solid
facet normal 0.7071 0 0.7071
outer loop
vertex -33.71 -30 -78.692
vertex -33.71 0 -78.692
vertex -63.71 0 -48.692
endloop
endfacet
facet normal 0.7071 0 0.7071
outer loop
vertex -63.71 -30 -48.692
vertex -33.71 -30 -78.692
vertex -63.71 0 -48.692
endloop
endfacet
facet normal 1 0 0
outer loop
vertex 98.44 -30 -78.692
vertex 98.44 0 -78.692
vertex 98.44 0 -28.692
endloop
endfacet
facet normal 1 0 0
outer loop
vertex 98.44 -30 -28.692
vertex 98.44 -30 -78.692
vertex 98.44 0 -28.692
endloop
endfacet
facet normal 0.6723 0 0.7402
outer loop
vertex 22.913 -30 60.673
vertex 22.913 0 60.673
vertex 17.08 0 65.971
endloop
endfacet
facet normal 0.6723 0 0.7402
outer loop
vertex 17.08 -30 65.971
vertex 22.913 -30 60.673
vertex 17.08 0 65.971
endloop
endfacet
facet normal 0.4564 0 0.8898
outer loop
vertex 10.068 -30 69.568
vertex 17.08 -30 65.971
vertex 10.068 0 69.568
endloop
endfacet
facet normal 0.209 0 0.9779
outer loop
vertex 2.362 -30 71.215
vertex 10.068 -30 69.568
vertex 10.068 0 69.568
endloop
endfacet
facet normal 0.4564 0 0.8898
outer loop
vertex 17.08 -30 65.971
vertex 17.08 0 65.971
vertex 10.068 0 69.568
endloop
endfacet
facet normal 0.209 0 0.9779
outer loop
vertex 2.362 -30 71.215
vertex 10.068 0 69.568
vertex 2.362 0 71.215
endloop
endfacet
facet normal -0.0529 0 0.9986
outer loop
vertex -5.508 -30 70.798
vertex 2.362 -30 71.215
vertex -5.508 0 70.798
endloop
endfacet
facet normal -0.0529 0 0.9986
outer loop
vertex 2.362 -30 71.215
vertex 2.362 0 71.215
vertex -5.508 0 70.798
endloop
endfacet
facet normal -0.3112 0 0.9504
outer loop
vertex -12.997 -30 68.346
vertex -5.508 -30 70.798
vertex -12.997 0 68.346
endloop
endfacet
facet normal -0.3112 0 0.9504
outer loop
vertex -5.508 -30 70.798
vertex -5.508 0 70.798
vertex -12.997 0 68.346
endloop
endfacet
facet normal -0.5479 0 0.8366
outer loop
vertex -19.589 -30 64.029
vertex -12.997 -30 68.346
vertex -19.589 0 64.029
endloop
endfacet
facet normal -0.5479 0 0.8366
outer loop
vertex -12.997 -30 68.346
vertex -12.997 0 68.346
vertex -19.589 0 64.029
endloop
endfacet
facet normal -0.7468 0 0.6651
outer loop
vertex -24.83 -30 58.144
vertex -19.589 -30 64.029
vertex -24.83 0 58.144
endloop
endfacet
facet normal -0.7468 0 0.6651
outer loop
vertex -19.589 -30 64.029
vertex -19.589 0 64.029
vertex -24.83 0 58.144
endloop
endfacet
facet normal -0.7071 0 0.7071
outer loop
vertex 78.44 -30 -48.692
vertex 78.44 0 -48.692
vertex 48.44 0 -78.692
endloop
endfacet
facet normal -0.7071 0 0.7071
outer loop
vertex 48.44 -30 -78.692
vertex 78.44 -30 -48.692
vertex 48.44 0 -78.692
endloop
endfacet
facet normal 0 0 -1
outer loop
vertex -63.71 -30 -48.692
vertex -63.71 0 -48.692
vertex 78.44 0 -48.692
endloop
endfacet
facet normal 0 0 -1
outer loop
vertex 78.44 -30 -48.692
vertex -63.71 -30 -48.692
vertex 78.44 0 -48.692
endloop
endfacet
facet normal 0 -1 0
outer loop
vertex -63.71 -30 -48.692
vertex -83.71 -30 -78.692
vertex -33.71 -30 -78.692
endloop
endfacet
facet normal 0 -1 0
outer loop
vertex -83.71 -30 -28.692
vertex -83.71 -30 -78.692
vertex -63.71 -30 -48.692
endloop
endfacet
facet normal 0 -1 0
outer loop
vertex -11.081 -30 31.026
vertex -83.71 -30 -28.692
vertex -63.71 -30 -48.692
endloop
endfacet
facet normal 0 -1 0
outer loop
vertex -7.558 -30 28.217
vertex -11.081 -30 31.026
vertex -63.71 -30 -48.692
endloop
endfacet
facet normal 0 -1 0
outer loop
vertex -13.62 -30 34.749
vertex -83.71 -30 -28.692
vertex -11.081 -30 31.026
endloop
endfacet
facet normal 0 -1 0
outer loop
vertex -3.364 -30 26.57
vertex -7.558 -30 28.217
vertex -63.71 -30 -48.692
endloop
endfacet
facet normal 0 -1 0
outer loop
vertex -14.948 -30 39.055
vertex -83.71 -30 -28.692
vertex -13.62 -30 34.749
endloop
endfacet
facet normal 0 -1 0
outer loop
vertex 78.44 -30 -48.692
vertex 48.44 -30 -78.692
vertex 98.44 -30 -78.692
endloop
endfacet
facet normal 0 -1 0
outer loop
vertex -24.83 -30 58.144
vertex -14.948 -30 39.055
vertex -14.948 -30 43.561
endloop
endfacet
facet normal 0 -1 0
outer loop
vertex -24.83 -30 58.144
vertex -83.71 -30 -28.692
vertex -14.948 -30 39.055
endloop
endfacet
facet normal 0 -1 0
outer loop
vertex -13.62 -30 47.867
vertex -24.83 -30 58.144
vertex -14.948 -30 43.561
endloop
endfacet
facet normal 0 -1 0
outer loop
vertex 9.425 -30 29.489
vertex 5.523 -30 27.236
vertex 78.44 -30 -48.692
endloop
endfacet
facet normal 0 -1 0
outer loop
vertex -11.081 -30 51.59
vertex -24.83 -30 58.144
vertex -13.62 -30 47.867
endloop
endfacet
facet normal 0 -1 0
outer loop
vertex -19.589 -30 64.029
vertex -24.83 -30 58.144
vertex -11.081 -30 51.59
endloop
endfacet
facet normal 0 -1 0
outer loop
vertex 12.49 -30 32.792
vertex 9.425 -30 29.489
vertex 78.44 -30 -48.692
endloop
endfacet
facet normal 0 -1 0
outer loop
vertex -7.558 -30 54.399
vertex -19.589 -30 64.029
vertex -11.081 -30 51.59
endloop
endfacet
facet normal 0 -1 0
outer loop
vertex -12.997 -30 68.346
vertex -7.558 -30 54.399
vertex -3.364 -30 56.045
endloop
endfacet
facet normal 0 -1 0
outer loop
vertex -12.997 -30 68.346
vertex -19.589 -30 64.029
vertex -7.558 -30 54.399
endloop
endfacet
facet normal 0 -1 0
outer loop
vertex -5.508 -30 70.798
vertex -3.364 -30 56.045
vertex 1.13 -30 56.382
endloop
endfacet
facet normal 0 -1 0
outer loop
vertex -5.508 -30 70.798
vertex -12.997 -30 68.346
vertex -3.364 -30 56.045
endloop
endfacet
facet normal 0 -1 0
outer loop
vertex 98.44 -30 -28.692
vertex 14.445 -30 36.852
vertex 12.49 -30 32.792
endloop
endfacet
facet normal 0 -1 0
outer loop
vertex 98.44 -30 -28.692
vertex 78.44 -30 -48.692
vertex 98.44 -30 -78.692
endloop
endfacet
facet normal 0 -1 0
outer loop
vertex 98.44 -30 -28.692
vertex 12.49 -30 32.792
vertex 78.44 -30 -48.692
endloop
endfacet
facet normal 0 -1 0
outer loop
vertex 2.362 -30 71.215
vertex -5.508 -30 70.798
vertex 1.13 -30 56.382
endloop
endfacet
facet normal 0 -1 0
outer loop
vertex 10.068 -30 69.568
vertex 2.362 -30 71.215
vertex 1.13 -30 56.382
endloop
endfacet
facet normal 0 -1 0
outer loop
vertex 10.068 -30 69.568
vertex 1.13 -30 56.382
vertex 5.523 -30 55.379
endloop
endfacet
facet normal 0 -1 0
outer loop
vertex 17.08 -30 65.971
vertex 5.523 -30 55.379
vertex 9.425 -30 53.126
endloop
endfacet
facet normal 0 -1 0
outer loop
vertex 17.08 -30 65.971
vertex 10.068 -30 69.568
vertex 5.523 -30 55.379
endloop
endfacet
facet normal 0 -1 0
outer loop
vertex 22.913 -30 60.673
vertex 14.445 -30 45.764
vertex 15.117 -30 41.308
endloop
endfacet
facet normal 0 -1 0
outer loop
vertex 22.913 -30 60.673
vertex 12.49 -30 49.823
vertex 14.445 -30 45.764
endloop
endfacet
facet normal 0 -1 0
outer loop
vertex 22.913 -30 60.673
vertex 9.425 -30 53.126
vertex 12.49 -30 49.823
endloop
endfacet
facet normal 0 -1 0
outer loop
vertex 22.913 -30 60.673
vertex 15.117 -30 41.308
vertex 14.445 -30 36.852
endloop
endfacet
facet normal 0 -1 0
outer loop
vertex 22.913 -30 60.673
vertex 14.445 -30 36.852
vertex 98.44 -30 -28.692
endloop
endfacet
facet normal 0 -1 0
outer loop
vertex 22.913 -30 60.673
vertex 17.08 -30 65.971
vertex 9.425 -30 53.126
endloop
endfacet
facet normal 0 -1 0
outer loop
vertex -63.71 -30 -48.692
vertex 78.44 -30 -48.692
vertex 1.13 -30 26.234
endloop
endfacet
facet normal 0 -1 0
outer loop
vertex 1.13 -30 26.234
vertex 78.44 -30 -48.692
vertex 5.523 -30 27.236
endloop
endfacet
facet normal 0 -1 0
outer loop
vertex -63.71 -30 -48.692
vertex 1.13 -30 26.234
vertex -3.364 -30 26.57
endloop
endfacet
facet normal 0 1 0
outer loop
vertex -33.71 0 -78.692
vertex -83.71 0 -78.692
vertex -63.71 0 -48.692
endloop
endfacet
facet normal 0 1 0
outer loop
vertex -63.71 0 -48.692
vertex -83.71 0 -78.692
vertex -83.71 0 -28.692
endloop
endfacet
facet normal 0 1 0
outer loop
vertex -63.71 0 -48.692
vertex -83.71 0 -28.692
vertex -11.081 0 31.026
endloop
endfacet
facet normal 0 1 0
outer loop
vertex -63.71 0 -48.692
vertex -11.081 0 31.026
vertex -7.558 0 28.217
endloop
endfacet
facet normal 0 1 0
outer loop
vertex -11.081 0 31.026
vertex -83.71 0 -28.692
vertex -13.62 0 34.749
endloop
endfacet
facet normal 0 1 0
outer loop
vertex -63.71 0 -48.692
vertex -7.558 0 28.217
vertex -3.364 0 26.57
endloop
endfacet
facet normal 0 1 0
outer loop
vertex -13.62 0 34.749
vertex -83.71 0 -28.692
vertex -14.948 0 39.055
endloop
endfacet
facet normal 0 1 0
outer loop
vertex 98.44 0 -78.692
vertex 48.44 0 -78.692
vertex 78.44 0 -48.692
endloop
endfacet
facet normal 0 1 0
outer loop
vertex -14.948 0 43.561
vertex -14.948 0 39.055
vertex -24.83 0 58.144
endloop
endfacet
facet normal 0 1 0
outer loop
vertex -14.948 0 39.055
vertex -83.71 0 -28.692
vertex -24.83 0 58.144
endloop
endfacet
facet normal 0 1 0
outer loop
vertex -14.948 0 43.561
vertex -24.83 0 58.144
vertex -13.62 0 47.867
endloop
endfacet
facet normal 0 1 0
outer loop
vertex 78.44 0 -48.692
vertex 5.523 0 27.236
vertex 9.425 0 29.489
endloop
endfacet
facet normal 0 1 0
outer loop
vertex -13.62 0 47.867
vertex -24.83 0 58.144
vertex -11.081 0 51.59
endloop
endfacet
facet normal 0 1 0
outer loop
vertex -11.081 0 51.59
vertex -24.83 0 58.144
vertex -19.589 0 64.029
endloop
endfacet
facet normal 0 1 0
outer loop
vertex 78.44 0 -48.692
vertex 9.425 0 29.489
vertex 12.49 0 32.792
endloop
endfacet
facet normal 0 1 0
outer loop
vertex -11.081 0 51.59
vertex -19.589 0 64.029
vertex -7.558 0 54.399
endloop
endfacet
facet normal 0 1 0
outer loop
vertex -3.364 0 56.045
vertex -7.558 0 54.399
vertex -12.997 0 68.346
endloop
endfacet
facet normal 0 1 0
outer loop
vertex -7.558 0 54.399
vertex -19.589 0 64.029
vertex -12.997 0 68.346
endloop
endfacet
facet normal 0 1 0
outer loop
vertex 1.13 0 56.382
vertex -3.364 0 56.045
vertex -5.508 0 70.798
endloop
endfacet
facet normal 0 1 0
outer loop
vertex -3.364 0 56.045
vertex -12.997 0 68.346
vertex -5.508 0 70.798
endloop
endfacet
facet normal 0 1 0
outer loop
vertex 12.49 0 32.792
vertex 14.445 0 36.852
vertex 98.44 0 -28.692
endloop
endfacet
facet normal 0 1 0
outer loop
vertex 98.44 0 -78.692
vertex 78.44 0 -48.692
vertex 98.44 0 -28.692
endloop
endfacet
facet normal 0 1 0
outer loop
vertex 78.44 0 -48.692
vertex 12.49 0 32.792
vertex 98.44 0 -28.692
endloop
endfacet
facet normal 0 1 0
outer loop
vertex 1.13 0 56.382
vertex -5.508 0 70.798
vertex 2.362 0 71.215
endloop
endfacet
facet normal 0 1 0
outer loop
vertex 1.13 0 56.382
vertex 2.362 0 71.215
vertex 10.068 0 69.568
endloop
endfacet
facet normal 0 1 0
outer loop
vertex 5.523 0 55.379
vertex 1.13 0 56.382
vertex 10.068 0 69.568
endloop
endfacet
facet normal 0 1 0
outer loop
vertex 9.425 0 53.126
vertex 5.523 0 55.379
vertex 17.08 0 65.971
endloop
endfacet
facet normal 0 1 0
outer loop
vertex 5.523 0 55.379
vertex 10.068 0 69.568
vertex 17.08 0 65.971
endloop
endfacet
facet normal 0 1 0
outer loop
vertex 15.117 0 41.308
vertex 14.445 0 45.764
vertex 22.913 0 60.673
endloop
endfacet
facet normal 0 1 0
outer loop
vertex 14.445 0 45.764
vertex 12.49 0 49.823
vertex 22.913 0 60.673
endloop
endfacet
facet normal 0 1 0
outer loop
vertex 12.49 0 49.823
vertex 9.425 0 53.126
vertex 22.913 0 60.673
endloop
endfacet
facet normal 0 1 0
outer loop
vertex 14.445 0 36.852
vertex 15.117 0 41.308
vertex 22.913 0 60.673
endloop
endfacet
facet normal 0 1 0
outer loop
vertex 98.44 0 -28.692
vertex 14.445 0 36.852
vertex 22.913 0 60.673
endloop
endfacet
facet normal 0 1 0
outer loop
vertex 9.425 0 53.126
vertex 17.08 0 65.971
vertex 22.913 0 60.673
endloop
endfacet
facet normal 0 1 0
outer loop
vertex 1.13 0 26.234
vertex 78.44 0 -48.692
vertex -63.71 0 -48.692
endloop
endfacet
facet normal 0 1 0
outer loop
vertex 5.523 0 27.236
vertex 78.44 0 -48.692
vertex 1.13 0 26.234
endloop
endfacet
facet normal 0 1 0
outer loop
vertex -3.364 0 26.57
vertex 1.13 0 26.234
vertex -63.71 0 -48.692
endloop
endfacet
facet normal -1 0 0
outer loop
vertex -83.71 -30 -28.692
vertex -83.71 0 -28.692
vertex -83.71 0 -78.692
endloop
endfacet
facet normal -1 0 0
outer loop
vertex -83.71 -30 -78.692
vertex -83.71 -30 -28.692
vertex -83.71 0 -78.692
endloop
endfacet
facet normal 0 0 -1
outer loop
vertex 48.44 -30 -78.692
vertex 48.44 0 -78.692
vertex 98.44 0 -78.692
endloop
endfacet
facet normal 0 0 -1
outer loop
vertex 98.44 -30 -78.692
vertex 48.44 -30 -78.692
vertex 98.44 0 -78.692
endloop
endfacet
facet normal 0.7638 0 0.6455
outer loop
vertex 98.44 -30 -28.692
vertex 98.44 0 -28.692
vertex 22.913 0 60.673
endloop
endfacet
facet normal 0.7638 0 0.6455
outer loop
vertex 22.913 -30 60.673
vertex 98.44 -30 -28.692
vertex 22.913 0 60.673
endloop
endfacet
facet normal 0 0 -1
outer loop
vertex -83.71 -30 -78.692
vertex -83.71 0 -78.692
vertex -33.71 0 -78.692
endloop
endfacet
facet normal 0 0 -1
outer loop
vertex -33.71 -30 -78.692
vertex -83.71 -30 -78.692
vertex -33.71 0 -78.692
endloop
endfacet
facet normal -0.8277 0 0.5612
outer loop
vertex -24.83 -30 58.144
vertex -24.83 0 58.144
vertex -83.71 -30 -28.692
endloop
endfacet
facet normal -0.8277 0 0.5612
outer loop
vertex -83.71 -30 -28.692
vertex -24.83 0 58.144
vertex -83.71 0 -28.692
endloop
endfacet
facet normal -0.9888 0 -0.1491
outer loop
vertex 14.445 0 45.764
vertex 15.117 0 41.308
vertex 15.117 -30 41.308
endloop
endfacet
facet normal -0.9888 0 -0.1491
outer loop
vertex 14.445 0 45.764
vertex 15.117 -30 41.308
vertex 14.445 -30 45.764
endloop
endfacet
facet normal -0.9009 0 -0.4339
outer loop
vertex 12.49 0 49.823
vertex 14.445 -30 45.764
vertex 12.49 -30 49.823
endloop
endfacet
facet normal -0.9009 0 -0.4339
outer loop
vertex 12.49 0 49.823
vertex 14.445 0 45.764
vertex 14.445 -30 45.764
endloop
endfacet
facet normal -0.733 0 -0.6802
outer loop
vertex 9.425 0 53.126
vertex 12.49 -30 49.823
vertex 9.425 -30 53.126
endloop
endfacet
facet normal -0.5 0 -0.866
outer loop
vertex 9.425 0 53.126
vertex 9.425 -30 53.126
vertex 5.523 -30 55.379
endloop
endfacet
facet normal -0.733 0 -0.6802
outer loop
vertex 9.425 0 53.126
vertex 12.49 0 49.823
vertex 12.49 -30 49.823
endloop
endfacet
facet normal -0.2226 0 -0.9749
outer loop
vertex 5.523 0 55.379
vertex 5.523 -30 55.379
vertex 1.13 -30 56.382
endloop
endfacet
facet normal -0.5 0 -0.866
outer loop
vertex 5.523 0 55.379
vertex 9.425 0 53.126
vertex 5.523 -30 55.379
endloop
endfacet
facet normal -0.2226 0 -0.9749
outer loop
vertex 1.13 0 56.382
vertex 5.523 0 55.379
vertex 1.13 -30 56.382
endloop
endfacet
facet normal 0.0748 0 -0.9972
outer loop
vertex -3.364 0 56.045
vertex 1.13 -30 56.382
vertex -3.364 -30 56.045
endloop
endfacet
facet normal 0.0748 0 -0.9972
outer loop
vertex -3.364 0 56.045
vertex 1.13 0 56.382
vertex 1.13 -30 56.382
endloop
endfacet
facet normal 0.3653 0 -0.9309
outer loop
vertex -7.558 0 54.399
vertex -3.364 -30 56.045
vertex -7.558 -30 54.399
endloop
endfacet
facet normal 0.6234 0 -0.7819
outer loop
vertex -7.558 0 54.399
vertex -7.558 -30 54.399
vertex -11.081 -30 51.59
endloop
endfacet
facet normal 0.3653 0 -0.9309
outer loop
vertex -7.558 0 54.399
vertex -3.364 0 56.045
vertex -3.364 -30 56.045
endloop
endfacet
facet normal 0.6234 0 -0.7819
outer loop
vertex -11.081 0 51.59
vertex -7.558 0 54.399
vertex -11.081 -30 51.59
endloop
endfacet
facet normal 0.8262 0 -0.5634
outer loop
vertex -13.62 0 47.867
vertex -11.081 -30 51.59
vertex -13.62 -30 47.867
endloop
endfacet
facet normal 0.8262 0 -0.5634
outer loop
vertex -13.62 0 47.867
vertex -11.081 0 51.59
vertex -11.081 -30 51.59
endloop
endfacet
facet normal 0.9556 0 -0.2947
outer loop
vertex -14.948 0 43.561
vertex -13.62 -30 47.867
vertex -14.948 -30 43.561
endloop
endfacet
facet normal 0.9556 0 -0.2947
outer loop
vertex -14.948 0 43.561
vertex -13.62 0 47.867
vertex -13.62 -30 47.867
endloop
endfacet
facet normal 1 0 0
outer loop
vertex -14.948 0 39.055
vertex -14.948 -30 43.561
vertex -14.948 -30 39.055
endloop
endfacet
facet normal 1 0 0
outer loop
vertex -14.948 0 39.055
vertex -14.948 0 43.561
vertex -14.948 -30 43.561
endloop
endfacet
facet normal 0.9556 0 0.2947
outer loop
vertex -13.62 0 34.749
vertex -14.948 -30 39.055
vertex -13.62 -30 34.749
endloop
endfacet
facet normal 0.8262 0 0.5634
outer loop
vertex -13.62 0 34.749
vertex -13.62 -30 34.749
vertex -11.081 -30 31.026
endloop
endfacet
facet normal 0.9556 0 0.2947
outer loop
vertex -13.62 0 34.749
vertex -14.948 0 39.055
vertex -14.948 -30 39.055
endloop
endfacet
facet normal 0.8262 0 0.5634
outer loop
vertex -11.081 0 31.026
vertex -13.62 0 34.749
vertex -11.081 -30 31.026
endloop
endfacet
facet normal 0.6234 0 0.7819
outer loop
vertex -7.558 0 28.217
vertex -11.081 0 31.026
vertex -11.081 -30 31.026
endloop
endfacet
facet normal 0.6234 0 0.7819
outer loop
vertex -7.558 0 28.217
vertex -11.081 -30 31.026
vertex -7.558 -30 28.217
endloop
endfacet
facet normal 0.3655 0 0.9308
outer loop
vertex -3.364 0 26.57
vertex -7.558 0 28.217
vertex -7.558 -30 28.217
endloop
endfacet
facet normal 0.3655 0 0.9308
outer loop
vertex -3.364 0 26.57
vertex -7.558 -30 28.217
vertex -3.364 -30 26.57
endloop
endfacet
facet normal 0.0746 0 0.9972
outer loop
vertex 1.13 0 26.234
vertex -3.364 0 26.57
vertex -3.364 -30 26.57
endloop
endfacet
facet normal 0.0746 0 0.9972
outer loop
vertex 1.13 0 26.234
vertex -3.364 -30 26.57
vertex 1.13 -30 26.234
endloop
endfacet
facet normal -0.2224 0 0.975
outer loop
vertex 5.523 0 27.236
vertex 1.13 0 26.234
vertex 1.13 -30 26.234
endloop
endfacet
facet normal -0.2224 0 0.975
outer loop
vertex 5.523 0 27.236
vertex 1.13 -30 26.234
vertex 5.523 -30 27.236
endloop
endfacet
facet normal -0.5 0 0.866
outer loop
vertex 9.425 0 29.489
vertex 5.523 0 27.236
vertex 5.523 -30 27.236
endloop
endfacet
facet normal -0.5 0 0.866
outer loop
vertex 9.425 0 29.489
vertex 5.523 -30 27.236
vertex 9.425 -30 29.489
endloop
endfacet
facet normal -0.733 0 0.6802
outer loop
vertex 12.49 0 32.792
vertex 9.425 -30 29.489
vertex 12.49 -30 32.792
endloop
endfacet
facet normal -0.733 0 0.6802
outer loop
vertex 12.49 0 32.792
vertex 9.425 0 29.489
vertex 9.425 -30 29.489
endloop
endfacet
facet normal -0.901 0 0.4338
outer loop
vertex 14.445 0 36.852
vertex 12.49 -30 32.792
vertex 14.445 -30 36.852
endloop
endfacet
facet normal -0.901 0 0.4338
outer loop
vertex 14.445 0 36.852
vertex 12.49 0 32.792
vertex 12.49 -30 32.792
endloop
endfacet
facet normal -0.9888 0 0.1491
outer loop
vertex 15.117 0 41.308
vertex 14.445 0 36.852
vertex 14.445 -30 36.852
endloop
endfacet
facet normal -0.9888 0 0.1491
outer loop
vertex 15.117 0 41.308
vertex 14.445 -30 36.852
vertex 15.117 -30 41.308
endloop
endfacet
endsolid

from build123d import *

# Parameters (mm, degrees)
F0_R     = 15.116536
F1_DEPTH = 30


with BuildPart() as f1:
    # F0 (on Front) → F1 (new body)
    with BuildSketch(Plane.XZ):
        with BuildLine():
            ThreePointArc((-24.83029, 58.144077), (-8.806, 12.62944), (30, 41.307905))
            ThreePointArc((30, 41.307905), (28.17257, 51.6184), (22.912913, 60.672781))
            ThreePointArc((22.912913, 60.672781), (-1.586717, 71.265914), (-24.83029, 58.144077))
        make_face()
        with Locations((0, 41.307905)):
            Circle(F0_R, mode=Mode.SUBTRACT)
        with BuildLine():
            ThreePointArc((22.912913, 60.672781), (28.17257, 51.6184), (30, 41.307905))
            ThreePointArc((30, 41.307905), (-8.806, 12.62944), (-24.83029, 58.144077))
            Line((-24.83029, 58.144077), (-83.709534, -28.692095))
            Line((-83.709534, -28.692095), (98.439749, -28.692095))
            Line((98.439749, -28.692095), (22.912913, 60.672781))
        make_face()
        Polygon((98.439749, -78.692095), (98.439749, -28.692095), (-83.709534, -28.692095), (-83.709534, -78.692095), (-33.709534, -78.692095), (-63.709534, -48.692095), (78.439749, -48.692095), (48.439749, -78.692095), align=None)
    extrude(amount=F1_DEPTH)


solid = f1.part
